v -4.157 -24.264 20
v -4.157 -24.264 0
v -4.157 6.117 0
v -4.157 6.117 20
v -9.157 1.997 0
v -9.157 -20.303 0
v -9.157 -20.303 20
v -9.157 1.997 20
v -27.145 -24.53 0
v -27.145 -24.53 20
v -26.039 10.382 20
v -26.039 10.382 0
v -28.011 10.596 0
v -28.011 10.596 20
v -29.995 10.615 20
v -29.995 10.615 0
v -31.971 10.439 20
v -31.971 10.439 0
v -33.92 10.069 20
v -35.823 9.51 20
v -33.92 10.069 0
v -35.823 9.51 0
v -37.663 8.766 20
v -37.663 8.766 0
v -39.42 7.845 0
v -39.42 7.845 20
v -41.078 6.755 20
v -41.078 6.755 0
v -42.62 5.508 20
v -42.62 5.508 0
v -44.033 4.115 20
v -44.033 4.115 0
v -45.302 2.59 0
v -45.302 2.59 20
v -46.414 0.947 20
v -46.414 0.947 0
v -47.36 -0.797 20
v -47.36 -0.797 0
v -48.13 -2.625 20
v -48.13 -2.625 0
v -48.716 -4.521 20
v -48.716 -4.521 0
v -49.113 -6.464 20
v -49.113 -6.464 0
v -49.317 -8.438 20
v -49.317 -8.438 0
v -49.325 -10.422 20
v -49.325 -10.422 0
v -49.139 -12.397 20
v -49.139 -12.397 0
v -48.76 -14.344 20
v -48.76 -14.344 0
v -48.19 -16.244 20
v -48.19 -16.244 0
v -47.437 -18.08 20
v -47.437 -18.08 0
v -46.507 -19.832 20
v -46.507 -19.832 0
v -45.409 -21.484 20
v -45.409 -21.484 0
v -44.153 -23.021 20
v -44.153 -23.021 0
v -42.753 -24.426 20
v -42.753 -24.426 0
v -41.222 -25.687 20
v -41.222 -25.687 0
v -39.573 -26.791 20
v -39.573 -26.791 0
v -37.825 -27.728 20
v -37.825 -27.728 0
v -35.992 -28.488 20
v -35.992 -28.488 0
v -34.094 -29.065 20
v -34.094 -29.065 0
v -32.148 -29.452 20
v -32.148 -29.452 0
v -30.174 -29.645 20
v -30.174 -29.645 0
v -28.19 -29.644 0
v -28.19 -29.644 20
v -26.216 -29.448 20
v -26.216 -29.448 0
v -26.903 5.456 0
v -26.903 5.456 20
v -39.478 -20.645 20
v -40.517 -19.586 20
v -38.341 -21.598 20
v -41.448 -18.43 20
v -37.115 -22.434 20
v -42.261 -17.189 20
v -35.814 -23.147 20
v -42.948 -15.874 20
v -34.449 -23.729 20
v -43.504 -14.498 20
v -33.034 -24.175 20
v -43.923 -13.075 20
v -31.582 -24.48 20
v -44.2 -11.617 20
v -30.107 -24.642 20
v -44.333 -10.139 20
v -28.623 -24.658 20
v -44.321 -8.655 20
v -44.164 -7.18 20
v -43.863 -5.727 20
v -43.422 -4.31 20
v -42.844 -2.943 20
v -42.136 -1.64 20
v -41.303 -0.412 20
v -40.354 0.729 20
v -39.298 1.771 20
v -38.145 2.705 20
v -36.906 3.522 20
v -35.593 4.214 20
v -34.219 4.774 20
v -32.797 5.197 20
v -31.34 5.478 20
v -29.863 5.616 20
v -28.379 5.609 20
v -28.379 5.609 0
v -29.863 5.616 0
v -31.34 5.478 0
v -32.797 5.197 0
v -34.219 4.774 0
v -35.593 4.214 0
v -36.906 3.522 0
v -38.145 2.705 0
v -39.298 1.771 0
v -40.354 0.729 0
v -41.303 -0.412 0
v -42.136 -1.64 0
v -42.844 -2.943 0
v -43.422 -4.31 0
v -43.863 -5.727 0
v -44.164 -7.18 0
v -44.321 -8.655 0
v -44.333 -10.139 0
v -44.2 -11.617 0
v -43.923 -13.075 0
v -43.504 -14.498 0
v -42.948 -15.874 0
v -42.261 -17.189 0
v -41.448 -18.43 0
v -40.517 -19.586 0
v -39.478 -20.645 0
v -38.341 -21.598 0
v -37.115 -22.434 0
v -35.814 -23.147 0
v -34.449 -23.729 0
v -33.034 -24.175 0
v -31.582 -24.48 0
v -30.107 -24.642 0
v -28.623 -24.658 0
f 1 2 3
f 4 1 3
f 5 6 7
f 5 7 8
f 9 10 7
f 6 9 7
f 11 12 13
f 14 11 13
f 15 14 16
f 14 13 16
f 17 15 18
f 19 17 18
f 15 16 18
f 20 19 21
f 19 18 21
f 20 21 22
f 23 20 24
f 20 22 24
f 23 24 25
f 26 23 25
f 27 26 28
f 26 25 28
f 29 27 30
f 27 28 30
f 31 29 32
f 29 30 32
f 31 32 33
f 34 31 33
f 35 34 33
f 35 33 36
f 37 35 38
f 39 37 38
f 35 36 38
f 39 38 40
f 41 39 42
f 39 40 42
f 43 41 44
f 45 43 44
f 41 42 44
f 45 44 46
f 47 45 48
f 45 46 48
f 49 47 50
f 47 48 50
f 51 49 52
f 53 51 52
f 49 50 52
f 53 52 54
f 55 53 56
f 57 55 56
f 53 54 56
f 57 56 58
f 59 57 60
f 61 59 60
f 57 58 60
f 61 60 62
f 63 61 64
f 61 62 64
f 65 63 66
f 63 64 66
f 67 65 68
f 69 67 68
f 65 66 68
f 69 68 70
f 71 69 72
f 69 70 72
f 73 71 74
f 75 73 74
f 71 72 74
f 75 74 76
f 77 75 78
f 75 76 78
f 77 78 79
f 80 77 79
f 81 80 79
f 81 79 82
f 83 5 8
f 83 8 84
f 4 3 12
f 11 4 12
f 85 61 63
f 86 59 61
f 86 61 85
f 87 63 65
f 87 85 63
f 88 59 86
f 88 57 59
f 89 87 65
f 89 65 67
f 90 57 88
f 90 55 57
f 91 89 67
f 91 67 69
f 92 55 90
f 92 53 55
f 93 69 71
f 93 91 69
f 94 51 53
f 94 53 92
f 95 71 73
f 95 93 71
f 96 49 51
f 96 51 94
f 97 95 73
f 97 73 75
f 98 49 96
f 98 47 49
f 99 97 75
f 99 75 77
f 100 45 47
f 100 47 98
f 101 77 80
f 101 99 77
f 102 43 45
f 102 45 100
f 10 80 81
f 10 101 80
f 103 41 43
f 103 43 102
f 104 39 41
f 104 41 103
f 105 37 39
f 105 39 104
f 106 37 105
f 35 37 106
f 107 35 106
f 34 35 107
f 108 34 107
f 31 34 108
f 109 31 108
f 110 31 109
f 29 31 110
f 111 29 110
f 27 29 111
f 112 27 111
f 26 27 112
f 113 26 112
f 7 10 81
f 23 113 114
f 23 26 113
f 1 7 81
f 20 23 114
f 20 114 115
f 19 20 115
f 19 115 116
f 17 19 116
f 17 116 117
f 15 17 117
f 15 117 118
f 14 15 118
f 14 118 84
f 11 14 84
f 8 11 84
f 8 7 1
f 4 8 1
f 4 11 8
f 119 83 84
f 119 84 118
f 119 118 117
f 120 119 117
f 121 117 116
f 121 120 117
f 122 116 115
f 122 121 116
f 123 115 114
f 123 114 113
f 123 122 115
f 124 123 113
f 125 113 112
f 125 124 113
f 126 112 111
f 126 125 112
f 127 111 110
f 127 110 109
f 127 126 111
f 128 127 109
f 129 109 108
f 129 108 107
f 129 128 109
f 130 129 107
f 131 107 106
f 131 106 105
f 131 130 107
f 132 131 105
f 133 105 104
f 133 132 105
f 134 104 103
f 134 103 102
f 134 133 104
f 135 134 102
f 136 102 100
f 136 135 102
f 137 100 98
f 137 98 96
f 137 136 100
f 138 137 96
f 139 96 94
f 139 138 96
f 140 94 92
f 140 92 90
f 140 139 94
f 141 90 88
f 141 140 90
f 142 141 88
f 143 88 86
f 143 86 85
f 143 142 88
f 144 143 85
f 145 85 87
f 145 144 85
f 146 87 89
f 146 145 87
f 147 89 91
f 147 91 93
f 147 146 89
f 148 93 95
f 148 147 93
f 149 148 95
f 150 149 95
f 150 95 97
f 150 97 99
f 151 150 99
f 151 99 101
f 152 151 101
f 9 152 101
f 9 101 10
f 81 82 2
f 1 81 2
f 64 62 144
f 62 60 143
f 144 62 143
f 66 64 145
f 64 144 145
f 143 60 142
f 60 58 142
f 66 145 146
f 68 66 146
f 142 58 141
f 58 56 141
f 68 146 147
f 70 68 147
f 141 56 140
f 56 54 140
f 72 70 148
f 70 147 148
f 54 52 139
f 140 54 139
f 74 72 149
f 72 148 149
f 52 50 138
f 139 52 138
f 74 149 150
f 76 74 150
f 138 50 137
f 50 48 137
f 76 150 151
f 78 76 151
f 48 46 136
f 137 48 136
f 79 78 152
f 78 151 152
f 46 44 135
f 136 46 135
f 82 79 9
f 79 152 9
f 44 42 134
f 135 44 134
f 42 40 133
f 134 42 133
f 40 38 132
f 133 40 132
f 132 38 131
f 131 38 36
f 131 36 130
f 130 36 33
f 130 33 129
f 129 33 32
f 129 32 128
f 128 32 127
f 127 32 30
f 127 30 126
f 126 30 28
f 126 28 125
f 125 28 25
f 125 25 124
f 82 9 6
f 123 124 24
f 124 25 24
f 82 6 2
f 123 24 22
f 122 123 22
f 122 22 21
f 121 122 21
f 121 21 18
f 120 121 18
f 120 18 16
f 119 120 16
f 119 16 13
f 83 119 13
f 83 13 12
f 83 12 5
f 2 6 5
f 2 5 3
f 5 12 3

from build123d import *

# Parameters (mm, degrees)
SALIENTE_EXTRUIR1_DEPTH = 20


with BuildPart() as part:
    # Croquis3 → Saliente-Extruir1 (new body)
    with BuildSketch(Plane.XY):
        with BuildLine():
            Line((-4.157247249, 6.116640811), (-26.038869698, 10.382100053))
            ThreePointArc((-26.038869698, 10.382100053), (-49.345509053, -9.429582016), (-26.215773458, -29.447511872))
            Line((-26.215773458, -29.447511872), (-4.157247249, -24.2640649))
            Line((-4.157247249, -24.2640649), (-4.157247249, 6.116640811))
        make_face()
        with BuildLine():
            Line((-9.157247249, 1.997195972), (-26.902985069, 5.456433128))
            ThreePointArc((-26.902985069, 5.456433128), (-44.345215717, -9.396971545), (-27.144674573, -24.529599364))
            Line((-27.144674573, -24.529599364), (-9.157247249, -20.302804028))
            Line((-9.157247249, -20.302804028), (-9.157247249, 1.997195972))
        make_face(mode=Mode.SUBTRACT)
    extrude(amount=SALIENTE_EXTRUIR1_DEPTH)


solid = part.part
